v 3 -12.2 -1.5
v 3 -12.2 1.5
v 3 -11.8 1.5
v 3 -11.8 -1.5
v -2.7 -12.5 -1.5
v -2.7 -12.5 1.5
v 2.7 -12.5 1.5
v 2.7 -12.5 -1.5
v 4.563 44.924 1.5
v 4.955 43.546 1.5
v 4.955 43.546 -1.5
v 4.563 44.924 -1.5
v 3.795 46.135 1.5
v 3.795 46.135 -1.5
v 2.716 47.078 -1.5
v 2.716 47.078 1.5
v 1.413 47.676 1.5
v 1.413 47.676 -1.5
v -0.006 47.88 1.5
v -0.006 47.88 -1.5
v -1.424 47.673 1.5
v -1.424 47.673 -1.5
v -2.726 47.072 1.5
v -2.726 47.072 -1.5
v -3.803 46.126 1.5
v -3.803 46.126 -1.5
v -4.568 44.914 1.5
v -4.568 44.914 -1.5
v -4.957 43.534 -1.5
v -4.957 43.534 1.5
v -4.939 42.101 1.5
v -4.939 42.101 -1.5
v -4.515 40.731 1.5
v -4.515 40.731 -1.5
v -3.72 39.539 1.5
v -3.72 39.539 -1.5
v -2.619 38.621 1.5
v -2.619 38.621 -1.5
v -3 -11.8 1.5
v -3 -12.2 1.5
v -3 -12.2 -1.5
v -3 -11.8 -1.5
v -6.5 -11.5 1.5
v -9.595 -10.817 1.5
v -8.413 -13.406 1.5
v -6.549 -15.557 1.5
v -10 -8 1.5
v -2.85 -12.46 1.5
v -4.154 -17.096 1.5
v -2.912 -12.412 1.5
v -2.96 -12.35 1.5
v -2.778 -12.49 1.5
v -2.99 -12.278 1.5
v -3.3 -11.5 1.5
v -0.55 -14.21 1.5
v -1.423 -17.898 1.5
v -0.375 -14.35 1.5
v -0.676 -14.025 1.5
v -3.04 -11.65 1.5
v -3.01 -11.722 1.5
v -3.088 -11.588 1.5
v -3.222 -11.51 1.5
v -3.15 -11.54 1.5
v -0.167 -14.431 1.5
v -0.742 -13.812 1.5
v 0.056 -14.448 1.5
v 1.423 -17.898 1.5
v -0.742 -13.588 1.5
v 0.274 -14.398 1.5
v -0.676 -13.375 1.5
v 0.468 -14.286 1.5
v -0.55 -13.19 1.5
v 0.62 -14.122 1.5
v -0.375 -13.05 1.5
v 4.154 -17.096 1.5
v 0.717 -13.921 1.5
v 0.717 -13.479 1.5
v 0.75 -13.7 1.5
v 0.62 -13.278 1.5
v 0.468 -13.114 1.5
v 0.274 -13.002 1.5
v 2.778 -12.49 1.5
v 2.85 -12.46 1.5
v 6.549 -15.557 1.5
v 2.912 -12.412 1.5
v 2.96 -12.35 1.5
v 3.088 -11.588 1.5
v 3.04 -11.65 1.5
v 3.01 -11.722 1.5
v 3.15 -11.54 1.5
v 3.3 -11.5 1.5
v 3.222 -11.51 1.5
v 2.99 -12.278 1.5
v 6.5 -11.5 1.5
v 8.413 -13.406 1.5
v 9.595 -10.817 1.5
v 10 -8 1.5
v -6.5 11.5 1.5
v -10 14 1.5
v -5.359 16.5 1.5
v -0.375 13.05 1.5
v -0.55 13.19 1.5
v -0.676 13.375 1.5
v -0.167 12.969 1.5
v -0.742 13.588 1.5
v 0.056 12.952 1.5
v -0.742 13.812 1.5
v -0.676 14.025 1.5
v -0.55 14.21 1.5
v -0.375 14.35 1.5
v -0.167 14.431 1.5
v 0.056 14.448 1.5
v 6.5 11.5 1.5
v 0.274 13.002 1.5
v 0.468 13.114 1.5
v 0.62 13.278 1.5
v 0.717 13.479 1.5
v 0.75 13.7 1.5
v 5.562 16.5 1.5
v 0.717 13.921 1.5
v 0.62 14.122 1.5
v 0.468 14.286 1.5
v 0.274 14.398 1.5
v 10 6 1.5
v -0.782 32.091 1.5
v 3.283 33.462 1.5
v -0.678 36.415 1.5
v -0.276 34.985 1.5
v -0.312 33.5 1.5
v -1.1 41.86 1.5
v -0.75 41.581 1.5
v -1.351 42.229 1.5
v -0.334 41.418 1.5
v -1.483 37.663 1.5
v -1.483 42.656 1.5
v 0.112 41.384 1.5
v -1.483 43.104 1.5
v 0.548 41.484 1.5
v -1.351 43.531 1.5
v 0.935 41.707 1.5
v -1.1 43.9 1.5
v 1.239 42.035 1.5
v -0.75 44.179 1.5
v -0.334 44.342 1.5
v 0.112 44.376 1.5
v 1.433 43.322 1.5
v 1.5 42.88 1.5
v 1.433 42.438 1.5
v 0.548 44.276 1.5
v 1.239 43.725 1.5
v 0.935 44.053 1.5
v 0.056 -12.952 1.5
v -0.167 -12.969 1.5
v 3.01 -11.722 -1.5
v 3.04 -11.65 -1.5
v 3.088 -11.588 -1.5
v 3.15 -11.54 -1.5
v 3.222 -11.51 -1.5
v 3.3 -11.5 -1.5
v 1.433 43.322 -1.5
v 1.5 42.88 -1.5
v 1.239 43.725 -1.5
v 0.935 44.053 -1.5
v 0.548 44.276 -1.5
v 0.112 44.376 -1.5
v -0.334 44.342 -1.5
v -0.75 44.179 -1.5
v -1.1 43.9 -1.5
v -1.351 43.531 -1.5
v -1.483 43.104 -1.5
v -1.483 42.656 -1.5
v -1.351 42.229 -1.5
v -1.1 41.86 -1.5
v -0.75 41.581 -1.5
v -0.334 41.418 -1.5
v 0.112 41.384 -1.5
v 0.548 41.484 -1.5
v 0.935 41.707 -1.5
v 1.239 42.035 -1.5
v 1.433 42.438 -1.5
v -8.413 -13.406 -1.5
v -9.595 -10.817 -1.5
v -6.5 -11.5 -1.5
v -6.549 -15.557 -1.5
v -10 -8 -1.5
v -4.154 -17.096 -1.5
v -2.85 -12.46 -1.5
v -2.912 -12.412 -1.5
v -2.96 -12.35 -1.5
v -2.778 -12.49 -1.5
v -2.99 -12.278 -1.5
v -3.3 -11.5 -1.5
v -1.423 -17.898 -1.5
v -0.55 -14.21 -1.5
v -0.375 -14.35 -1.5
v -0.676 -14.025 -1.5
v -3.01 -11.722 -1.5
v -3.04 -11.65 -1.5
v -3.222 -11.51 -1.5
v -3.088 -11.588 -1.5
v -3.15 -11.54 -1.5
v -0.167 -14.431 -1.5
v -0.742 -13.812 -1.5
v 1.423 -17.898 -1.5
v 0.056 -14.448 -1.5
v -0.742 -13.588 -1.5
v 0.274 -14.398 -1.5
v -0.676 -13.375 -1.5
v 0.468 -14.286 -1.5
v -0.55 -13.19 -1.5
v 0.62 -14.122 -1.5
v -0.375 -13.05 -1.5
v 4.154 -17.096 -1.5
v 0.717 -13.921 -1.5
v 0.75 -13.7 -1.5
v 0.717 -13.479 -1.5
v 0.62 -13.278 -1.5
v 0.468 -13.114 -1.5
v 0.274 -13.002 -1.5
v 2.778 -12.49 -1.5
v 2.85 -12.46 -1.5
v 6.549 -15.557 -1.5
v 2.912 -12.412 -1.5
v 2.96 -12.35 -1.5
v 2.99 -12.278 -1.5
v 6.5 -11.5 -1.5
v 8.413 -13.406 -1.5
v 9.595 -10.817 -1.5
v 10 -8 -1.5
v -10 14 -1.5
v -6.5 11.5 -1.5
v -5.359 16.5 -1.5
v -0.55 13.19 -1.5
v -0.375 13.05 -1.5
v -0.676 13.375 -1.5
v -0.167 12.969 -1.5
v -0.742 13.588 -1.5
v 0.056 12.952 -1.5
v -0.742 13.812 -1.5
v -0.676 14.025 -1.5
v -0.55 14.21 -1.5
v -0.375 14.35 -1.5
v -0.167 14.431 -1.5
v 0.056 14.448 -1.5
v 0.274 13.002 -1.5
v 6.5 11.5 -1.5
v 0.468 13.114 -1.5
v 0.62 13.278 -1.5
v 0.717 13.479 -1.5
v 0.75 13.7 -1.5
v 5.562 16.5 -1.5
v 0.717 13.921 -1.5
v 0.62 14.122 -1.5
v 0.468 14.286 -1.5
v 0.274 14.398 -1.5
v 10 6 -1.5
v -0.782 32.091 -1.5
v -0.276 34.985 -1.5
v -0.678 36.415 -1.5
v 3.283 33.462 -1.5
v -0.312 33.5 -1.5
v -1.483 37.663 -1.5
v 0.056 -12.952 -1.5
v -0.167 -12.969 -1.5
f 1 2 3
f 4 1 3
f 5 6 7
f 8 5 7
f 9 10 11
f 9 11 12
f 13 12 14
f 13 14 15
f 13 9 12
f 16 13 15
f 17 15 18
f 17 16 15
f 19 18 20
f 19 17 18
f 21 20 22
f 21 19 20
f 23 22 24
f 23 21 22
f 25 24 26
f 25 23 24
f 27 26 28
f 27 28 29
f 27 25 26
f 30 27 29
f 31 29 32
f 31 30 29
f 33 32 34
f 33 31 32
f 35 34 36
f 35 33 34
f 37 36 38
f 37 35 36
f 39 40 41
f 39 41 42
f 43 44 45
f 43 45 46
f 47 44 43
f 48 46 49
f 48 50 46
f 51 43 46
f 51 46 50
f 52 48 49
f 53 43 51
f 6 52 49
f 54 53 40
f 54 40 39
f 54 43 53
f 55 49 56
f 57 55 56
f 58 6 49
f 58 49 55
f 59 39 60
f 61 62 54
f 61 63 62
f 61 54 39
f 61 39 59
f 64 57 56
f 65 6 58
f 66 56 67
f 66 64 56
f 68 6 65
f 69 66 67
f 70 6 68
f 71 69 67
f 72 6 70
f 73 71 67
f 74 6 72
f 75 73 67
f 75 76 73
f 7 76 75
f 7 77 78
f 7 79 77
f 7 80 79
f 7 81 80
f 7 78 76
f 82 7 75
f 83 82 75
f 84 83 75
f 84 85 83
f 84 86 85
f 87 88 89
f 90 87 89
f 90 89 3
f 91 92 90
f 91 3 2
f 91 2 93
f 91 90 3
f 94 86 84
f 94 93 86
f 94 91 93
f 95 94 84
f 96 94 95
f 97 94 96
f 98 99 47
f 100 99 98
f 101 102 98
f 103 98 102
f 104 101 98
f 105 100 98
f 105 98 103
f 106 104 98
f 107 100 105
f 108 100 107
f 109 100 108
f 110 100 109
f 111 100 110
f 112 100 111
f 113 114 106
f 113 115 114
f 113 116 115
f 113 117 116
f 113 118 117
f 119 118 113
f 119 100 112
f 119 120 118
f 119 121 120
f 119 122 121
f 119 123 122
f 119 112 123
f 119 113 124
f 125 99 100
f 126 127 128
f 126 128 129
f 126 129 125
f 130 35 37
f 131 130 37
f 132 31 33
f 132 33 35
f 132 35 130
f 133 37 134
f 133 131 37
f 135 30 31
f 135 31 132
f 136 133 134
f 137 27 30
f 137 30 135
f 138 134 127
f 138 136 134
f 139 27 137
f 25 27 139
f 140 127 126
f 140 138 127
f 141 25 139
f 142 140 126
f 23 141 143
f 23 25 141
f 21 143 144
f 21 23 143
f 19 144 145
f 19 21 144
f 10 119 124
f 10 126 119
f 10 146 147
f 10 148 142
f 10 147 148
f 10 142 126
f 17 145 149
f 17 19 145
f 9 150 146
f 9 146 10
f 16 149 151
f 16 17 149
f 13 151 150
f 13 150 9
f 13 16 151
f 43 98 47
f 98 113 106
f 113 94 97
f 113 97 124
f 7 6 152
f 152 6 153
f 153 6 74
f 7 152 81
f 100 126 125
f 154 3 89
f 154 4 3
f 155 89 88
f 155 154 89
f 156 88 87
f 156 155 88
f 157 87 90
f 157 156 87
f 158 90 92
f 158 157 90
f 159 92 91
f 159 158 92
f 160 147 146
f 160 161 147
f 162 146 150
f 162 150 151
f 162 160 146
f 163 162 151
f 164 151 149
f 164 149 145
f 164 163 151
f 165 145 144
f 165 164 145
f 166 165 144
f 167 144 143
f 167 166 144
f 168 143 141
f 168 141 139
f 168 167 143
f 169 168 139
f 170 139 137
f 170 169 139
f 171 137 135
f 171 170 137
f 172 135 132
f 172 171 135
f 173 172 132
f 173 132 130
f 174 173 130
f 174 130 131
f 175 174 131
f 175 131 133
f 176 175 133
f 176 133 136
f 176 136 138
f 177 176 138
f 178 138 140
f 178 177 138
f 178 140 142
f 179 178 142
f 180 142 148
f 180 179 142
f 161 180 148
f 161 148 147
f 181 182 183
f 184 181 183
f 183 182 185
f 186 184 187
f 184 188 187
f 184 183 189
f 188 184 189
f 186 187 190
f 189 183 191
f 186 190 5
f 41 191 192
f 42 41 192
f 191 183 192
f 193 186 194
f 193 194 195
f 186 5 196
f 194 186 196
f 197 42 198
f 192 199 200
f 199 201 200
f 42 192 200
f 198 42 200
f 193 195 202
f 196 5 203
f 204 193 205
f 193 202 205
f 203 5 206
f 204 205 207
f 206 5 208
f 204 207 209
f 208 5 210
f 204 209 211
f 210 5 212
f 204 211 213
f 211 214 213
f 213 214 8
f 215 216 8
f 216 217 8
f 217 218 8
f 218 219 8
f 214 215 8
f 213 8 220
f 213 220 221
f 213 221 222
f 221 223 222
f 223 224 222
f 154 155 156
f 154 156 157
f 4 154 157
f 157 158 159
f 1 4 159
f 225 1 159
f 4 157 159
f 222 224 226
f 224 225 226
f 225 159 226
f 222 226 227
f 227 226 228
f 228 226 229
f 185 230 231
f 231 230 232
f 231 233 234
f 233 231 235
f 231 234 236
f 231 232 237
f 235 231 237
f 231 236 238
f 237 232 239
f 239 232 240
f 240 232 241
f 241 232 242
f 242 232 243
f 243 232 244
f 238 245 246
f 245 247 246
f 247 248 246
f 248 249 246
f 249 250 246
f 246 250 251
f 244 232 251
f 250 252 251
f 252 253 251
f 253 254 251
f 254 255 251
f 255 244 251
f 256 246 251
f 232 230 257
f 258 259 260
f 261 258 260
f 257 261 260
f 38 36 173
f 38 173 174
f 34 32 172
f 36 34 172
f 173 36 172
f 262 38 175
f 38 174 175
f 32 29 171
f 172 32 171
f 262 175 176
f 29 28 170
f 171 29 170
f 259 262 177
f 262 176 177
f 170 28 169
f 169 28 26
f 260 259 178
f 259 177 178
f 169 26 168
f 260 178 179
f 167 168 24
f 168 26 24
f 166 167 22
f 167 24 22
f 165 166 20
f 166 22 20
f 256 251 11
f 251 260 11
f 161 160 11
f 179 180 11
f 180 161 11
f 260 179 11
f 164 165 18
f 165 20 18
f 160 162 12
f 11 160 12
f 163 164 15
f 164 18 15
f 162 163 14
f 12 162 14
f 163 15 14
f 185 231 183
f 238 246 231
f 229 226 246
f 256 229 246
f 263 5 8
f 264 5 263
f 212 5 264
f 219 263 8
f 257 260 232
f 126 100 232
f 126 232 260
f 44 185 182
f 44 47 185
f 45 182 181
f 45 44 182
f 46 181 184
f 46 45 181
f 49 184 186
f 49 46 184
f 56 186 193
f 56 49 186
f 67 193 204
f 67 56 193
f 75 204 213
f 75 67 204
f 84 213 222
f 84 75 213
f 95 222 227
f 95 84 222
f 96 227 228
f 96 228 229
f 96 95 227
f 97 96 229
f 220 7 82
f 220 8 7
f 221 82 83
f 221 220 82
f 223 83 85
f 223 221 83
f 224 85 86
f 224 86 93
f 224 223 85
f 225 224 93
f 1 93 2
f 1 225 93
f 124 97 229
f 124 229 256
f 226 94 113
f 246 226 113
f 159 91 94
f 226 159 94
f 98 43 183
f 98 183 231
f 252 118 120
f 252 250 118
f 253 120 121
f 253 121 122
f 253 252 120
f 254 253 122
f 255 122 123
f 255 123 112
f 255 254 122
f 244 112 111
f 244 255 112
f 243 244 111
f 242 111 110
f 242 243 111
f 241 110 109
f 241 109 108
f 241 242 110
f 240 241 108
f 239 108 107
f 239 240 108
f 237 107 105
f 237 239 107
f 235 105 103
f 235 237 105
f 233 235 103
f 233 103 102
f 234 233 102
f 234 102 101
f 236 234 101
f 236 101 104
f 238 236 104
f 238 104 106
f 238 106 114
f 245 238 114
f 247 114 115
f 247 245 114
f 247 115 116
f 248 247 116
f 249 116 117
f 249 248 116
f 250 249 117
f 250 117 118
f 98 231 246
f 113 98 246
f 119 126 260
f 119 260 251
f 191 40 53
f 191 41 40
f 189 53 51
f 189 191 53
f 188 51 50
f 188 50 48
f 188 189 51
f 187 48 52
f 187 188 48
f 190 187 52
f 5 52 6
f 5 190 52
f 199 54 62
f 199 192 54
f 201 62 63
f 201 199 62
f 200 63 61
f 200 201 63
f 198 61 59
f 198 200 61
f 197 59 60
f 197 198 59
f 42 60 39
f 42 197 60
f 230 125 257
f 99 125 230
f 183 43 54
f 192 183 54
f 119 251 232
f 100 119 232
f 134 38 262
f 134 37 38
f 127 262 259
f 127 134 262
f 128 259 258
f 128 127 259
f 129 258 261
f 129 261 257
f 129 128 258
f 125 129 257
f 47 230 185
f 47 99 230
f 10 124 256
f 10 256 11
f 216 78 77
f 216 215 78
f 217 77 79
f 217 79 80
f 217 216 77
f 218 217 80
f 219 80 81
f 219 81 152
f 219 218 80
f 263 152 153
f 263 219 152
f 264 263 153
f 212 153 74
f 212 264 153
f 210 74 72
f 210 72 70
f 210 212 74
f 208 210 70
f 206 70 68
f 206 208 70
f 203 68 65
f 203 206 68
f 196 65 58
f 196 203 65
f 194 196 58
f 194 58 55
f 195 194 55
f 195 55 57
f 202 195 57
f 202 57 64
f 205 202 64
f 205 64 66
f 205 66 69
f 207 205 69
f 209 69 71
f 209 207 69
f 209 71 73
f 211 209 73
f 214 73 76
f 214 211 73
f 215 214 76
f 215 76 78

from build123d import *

# Parameters (mm, degrees)
SKETCH_1_R          = 0.75
SKETCH_1_W          = 13
SKETCH_1_H          = 23
SKETCH_1_R_2        = 1.5
EXTRUDE_1_DEPTH     = 1.5
SKETCH_2_W          = 6
SKETCH_2_H          = 1
CUT_EXTRUDE_1_DEPTH = 3
FILLET_1_R          = 0.3


with BuildPart() as part:
    # 草图1 → 凸台-拉伸1 (new body, symmetric)
    with BuildSketch(Plane.XY):
        with BuildLine():
            ThreePointArc((-10, -8), (0, -18), (10, -8))
            Line((10, -8), (10, 6))
            Line((10, 6), (4.955472685, 43.54580062))
            ThreePointArc((4.955472685, 43.54580062), (-2.725773115, 47.071677579), (-2.618575221, 38.62053245))
            ThreePointArc((-2.618575221, 38.62053245), (-0.423906888, 35.714832413), (-0.782117822, 32.091112401))
            Line((-0.782117822, 32.091112401), (-10, 14))
            Line((-10, 14), (-10, -8))
        make_face()
        with Locations((0, -13.7)):
            Circle(SKETCH_1_R, mode=Mode.SUBTRACT)
        Rectangle(SKETCH_1_W, SKETCH_1_H, mode=Mode.SUBTRACT)
        with Locations((0, 13.7)):
            Circle(SKETCH_1_R, mode=Mode.SUBTRACT)
        with Locations((0, 42.88)):
            Circle(SKETCH_1_R_2, mode=Mode.SUBTRACT)
        Polygon((5.562298916, 16.5), (-5.359207663, 16.5), (3.283346167, 33.461966942), align=None, mode=Mode.SUBTRACT)
    extrude(amount=EXTRUDE_1_DEPTH, both=True)

    # 草图2 → 切除-拉伸1 (cut)
    with BuildSketch(Plane.XY.offset(1.5)):
        with Locations((0, -12)):
            Rectangle(SKETCH_2_W, SKETCH_2_H)
    extrude(amount=-CUT_EXTRUDE_1_DEPTH, mode=Mode.SUBTRACT)

    # 圆角1
    fillet_1_edges = [part.edges().sort_by_distance(p)[0] for p in [
        (-3, -11.5, 0),
        (3, -11.5, 0),
        (3, -12.5, 0),
        (-3, -12.5, 0),
    ]]
    fillet(fillet_1_edges, radius=FILLET_1_R)


solid = part.part
